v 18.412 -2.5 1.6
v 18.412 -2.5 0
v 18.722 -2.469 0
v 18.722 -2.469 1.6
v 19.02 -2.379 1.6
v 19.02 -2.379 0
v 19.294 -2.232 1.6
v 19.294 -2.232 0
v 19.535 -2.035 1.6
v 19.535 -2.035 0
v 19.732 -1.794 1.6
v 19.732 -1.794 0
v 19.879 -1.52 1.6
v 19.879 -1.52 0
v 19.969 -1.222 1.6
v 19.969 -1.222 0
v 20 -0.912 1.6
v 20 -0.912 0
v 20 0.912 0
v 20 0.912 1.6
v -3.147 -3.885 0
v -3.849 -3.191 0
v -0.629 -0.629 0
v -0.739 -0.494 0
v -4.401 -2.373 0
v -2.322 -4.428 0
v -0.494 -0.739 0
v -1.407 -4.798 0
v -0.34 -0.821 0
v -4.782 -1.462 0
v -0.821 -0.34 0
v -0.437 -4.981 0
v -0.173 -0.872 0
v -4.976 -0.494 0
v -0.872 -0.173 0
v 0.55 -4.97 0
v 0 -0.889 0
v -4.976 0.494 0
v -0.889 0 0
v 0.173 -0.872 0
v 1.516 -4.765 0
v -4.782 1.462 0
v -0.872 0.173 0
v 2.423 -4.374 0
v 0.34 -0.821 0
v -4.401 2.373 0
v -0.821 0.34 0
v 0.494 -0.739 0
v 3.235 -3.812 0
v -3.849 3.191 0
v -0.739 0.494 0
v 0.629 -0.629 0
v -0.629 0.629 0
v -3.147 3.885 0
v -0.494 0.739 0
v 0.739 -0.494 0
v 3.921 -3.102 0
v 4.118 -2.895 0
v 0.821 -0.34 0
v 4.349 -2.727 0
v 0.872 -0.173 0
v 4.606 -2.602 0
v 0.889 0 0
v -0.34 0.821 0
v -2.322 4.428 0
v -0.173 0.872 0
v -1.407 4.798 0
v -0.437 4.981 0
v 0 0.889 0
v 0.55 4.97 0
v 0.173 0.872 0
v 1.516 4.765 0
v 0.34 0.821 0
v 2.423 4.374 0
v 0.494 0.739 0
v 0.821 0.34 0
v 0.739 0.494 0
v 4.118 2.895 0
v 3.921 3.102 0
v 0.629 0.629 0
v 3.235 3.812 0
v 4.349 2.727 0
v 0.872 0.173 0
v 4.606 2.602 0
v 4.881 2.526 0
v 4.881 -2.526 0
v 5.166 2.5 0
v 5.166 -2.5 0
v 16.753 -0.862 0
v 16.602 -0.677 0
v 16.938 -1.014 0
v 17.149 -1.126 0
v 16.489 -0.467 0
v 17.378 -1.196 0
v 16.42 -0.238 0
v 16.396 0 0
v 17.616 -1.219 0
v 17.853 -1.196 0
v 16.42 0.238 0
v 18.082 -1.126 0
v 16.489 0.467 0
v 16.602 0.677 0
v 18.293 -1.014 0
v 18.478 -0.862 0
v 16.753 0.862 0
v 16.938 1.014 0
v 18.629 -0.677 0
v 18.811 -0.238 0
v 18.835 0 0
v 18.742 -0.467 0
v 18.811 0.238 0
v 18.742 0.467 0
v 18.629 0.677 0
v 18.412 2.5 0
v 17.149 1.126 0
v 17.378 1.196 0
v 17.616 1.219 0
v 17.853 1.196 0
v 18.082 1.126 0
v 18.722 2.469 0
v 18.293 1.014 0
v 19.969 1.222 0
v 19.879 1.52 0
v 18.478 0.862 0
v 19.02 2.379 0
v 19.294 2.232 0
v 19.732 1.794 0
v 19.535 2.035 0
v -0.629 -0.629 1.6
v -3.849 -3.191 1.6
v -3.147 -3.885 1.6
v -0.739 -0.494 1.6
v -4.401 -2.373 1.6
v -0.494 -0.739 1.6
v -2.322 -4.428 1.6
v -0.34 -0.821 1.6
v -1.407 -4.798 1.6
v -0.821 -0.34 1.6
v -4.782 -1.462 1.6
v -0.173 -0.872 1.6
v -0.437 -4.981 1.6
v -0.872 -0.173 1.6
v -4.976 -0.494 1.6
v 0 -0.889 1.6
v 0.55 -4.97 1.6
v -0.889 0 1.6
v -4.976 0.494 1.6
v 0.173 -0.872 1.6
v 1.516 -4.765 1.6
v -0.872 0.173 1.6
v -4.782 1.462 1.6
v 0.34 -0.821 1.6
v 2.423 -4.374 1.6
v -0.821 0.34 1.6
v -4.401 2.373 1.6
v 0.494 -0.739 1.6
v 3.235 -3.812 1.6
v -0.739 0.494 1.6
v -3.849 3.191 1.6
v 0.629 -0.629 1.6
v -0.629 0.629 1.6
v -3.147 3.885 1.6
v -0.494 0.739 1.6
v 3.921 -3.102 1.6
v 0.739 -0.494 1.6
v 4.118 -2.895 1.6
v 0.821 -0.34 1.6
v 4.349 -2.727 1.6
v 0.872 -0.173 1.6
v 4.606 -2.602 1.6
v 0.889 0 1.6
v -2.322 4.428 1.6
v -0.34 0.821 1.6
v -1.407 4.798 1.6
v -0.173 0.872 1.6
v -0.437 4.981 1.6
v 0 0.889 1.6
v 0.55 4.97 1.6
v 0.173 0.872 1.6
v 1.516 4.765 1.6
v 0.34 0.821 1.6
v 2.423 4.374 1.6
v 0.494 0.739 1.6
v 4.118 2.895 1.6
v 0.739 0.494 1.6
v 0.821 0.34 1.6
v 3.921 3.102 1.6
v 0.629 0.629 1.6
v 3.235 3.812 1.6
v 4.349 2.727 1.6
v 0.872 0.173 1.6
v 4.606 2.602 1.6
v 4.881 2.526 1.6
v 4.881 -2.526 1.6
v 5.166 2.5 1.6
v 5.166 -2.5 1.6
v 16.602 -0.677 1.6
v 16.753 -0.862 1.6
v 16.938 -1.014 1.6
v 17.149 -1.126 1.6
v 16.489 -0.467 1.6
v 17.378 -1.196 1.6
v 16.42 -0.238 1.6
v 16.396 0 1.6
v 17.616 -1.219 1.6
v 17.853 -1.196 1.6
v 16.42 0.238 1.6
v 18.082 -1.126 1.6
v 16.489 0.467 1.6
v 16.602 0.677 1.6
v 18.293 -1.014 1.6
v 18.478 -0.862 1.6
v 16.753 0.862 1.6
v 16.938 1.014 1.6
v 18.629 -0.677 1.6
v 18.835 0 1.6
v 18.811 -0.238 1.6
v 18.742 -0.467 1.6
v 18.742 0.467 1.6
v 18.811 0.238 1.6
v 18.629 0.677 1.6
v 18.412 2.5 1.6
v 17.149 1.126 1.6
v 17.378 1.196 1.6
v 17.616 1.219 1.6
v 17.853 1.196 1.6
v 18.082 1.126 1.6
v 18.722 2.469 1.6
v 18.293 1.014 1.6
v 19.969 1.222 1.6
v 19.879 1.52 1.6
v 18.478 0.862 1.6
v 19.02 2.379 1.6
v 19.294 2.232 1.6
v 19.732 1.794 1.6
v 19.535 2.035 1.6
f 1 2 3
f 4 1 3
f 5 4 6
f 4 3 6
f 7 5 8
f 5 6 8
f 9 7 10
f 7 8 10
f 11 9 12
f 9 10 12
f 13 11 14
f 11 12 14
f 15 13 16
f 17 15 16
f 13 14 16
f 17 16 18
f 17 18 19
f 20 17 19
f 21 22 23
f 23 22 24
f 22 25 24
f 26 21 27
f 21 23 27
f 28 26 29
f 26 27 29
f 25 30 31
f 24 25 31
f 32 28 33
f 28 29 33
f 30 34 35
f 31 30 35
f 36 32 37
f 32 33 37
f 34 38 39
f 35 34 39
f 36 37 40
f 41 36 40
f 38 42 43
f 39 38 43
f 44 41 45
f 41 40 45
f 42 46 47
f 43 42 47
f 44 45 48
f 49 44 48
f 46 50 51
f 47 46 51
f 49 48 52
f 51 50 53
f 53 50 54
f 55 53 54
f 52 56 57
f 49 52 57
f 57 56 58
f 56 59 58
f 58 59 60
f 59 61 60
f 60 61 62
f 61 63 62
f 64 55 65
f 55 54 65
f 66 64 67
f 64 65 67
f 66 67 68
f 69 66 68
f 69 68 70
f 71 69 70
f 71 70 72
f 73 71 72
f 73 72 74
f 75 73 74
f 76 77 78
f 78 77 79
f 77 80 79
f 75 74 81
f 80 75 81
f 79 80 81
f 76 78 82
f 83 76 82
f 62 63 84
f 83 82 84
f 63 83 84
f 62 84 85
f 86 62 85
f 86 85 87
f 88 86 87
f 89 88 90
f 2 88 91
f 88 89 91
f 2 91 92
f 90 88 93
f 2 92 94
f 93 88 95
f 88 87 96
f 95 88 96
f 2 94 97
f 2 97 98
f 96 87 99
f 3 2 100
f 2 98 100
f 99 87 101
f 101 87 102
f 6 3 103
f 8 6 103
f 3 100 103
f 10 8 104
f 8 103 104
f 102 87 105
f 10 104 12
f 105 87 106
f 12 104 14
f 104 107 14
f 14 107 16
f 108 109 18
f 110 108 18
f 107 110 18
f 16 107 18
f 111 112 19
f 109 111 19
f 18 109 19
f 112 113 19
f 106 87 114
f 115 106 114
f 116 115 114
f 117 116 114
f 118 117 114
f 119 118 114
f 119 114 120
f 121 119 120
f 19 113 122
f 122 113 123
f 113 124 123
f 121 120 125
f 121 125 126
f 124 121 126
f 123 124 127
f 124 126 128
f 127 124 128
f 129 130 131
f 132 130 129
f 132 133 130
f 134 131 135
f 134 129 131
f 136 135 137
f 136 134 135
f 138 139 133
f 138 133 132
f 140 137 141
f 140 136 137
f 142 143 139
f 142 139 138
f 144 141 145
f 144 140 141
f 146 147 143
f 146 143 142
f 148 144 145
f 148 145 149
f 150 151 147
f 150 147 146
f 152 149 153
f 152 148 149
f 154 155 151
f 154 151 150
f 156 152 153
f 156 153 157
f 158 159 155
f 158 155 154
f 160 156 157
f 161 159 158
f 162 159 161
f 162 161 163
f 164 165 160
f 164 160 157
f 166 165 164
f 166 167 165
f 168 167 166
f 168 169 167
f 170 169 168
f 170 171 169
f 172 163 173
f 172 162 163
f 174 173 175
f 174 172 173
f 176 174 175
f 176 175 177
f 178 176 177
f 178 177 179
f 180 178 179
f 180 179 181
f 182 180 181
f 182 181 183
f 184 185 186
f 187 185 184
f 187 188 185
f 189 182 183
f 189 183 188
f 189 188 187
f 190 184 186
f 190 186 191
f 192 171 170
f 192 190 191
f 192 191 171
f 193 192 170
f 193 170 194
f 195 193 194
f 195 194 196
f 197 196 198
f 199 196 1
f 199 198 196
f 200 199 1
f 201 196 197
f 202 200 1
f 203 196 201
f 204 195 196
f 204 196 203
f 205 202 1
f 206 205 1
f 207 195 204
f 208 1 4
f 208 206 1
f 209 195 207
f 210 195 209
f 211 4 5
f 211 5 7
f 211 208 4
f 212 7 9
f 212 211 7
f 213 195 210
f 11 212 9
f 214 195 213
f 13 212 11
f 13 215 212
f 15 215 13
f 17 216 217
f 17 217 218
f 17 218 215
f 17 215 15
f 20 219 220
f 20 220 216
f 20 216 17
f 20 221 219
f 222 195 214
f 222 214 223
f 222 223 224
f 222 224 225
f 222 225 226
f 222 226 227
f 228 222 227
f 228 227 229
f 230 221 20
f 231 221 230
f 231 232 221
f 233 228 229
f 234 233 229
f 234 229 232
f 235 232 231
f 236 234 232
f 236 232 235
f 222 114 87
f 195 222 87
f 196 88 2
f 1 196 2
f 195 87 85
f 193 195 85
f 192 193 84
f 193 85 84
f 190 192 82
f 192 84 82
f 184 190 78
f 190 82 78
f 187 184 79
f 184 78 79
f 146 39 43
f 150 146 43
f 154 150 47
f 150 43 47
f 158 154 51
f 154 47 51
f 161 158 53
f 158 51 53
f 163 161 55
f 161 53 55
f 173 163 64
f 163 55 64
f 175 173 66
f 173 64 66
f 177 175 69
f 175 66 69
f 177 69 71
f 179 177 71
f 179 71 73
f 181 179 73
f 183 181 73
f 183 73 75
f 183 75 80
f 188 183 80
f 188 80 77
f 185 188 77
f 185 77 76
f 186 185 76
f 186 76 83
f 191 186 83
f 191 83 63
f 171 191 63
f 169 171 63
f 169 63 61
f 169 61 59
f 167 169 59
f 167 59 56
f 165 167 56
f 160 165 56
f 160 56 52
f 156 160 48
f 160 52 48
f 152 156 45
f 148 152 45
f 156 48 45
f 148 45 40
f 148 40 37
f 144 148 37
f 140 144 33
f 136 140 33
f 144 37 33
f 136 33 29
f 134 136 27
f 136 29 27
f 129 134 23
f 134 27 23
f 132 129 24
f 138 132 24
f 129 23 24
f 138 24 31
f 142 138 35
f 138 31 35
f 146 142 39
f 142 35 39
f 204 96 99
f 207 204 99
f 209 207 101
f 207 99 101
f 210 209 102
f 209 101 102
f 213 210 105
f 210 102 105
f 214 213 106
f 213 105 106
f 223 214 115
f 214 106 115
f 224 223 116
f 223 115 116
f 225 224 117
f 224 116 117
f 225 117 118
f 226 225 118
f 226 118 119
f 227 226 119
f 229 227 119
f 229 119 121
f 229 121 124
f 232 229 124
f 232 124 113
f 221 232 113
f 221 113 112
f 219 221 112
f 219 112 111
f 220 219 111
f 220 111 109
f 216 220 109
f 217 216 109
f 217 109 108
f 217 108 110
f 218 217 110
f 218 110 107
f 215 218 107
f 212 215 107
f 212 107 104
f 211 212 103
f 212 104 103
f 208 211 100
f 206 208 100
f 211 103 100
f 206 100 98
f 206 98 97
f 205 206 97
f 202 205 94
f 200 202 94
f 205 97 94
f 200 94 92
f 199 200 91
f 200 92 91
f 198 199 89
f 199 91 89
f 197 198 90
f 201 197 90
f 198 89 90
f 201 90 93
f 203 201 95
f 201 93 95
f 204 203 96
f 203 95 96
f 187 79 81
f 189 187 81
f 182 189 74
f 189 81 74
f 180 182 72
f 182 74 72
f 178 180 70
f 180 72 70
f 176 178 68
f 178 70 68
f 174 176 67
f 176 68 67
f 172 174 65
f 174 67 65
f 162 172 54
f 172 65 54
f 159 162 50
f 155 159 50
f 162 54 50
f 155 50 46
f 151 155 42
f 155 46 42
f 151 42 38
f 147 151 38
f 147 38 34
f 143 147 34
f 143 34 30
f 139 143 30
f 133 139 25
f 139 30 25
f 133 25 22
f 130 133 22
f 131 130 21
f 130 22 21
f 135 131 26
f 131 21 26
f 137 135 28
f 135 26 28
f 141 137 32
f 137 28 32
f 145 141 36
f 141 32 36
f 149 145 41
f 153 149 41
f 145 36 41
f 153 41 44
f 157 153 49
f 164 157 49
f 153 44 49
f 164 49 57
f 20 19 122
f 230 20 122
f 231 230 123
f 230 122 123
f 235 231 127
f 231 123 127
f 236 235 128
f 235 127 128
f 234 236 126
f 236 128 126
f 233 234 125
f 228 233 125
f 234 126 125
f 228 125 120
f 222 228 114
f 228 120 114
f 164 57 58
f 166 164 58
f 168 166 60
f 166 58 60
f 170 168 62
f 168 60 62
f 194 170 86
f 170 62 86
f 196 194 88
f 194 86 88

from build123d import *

# Parameters (mm, degrees)
BOSS_EXTRUDE1_DEPTH   = 1.6002
F_0_CLEARANCE_HOLE1_D = 1.778
F_2_CLEARANCE_HOLE1_D = 2.4384


with BuildPart() as part:
    # Sketch1 → Boss-Extrude1 (new body)
    with BuildSketch(Plane.XY):
        with BuildLine():
            Line((5.16599458, -2.5), (18.4125, -2.5))
            ThreePointArc((18.4125, -2.5), (19.535032015, -2.035032015), (20, -0.9125))
            Line((20, -0.9125), (20, 0.9125))
            ThreePointArc((20, 0.9125), (19.535032015, 2.035032015), (18.4125, 2.5))
            Line((18.4125, 2.5), (5.16599458, 2.5))
            ThreePointArc((5.16599458, 2.5), (4.474468718, 2.658532459), (3.921058505, 3.102466793))
            ThreePointArc((3.921058505, 3.102466793), (-5, 0), (3.921058505, -3.102466793))
            ThreePointArc((3.921058505, -3.102466793), (4.474468718, -2.658532459), (5.16599458, -2.5))
        make_face()
    extrude(amount=BOSS_EXTRUDE1_DEPTH)

    # #0 Clearance Hole1 (through all)
    with Locations(Plane.XY.offset(1.6002)):
        with Locations((0, 0)):
            Hole(F_0_CLEARANCE_HOLE1_D / 2)

    # #2 Clearance Hole1 (through all)
    with Locations(Plane.XY.offset(1.6002)):
        with Locations((17.615594793, 0)):
            Hole(F_2_CLEARANCE_HOLE1_D / 2)


solid = part.part
